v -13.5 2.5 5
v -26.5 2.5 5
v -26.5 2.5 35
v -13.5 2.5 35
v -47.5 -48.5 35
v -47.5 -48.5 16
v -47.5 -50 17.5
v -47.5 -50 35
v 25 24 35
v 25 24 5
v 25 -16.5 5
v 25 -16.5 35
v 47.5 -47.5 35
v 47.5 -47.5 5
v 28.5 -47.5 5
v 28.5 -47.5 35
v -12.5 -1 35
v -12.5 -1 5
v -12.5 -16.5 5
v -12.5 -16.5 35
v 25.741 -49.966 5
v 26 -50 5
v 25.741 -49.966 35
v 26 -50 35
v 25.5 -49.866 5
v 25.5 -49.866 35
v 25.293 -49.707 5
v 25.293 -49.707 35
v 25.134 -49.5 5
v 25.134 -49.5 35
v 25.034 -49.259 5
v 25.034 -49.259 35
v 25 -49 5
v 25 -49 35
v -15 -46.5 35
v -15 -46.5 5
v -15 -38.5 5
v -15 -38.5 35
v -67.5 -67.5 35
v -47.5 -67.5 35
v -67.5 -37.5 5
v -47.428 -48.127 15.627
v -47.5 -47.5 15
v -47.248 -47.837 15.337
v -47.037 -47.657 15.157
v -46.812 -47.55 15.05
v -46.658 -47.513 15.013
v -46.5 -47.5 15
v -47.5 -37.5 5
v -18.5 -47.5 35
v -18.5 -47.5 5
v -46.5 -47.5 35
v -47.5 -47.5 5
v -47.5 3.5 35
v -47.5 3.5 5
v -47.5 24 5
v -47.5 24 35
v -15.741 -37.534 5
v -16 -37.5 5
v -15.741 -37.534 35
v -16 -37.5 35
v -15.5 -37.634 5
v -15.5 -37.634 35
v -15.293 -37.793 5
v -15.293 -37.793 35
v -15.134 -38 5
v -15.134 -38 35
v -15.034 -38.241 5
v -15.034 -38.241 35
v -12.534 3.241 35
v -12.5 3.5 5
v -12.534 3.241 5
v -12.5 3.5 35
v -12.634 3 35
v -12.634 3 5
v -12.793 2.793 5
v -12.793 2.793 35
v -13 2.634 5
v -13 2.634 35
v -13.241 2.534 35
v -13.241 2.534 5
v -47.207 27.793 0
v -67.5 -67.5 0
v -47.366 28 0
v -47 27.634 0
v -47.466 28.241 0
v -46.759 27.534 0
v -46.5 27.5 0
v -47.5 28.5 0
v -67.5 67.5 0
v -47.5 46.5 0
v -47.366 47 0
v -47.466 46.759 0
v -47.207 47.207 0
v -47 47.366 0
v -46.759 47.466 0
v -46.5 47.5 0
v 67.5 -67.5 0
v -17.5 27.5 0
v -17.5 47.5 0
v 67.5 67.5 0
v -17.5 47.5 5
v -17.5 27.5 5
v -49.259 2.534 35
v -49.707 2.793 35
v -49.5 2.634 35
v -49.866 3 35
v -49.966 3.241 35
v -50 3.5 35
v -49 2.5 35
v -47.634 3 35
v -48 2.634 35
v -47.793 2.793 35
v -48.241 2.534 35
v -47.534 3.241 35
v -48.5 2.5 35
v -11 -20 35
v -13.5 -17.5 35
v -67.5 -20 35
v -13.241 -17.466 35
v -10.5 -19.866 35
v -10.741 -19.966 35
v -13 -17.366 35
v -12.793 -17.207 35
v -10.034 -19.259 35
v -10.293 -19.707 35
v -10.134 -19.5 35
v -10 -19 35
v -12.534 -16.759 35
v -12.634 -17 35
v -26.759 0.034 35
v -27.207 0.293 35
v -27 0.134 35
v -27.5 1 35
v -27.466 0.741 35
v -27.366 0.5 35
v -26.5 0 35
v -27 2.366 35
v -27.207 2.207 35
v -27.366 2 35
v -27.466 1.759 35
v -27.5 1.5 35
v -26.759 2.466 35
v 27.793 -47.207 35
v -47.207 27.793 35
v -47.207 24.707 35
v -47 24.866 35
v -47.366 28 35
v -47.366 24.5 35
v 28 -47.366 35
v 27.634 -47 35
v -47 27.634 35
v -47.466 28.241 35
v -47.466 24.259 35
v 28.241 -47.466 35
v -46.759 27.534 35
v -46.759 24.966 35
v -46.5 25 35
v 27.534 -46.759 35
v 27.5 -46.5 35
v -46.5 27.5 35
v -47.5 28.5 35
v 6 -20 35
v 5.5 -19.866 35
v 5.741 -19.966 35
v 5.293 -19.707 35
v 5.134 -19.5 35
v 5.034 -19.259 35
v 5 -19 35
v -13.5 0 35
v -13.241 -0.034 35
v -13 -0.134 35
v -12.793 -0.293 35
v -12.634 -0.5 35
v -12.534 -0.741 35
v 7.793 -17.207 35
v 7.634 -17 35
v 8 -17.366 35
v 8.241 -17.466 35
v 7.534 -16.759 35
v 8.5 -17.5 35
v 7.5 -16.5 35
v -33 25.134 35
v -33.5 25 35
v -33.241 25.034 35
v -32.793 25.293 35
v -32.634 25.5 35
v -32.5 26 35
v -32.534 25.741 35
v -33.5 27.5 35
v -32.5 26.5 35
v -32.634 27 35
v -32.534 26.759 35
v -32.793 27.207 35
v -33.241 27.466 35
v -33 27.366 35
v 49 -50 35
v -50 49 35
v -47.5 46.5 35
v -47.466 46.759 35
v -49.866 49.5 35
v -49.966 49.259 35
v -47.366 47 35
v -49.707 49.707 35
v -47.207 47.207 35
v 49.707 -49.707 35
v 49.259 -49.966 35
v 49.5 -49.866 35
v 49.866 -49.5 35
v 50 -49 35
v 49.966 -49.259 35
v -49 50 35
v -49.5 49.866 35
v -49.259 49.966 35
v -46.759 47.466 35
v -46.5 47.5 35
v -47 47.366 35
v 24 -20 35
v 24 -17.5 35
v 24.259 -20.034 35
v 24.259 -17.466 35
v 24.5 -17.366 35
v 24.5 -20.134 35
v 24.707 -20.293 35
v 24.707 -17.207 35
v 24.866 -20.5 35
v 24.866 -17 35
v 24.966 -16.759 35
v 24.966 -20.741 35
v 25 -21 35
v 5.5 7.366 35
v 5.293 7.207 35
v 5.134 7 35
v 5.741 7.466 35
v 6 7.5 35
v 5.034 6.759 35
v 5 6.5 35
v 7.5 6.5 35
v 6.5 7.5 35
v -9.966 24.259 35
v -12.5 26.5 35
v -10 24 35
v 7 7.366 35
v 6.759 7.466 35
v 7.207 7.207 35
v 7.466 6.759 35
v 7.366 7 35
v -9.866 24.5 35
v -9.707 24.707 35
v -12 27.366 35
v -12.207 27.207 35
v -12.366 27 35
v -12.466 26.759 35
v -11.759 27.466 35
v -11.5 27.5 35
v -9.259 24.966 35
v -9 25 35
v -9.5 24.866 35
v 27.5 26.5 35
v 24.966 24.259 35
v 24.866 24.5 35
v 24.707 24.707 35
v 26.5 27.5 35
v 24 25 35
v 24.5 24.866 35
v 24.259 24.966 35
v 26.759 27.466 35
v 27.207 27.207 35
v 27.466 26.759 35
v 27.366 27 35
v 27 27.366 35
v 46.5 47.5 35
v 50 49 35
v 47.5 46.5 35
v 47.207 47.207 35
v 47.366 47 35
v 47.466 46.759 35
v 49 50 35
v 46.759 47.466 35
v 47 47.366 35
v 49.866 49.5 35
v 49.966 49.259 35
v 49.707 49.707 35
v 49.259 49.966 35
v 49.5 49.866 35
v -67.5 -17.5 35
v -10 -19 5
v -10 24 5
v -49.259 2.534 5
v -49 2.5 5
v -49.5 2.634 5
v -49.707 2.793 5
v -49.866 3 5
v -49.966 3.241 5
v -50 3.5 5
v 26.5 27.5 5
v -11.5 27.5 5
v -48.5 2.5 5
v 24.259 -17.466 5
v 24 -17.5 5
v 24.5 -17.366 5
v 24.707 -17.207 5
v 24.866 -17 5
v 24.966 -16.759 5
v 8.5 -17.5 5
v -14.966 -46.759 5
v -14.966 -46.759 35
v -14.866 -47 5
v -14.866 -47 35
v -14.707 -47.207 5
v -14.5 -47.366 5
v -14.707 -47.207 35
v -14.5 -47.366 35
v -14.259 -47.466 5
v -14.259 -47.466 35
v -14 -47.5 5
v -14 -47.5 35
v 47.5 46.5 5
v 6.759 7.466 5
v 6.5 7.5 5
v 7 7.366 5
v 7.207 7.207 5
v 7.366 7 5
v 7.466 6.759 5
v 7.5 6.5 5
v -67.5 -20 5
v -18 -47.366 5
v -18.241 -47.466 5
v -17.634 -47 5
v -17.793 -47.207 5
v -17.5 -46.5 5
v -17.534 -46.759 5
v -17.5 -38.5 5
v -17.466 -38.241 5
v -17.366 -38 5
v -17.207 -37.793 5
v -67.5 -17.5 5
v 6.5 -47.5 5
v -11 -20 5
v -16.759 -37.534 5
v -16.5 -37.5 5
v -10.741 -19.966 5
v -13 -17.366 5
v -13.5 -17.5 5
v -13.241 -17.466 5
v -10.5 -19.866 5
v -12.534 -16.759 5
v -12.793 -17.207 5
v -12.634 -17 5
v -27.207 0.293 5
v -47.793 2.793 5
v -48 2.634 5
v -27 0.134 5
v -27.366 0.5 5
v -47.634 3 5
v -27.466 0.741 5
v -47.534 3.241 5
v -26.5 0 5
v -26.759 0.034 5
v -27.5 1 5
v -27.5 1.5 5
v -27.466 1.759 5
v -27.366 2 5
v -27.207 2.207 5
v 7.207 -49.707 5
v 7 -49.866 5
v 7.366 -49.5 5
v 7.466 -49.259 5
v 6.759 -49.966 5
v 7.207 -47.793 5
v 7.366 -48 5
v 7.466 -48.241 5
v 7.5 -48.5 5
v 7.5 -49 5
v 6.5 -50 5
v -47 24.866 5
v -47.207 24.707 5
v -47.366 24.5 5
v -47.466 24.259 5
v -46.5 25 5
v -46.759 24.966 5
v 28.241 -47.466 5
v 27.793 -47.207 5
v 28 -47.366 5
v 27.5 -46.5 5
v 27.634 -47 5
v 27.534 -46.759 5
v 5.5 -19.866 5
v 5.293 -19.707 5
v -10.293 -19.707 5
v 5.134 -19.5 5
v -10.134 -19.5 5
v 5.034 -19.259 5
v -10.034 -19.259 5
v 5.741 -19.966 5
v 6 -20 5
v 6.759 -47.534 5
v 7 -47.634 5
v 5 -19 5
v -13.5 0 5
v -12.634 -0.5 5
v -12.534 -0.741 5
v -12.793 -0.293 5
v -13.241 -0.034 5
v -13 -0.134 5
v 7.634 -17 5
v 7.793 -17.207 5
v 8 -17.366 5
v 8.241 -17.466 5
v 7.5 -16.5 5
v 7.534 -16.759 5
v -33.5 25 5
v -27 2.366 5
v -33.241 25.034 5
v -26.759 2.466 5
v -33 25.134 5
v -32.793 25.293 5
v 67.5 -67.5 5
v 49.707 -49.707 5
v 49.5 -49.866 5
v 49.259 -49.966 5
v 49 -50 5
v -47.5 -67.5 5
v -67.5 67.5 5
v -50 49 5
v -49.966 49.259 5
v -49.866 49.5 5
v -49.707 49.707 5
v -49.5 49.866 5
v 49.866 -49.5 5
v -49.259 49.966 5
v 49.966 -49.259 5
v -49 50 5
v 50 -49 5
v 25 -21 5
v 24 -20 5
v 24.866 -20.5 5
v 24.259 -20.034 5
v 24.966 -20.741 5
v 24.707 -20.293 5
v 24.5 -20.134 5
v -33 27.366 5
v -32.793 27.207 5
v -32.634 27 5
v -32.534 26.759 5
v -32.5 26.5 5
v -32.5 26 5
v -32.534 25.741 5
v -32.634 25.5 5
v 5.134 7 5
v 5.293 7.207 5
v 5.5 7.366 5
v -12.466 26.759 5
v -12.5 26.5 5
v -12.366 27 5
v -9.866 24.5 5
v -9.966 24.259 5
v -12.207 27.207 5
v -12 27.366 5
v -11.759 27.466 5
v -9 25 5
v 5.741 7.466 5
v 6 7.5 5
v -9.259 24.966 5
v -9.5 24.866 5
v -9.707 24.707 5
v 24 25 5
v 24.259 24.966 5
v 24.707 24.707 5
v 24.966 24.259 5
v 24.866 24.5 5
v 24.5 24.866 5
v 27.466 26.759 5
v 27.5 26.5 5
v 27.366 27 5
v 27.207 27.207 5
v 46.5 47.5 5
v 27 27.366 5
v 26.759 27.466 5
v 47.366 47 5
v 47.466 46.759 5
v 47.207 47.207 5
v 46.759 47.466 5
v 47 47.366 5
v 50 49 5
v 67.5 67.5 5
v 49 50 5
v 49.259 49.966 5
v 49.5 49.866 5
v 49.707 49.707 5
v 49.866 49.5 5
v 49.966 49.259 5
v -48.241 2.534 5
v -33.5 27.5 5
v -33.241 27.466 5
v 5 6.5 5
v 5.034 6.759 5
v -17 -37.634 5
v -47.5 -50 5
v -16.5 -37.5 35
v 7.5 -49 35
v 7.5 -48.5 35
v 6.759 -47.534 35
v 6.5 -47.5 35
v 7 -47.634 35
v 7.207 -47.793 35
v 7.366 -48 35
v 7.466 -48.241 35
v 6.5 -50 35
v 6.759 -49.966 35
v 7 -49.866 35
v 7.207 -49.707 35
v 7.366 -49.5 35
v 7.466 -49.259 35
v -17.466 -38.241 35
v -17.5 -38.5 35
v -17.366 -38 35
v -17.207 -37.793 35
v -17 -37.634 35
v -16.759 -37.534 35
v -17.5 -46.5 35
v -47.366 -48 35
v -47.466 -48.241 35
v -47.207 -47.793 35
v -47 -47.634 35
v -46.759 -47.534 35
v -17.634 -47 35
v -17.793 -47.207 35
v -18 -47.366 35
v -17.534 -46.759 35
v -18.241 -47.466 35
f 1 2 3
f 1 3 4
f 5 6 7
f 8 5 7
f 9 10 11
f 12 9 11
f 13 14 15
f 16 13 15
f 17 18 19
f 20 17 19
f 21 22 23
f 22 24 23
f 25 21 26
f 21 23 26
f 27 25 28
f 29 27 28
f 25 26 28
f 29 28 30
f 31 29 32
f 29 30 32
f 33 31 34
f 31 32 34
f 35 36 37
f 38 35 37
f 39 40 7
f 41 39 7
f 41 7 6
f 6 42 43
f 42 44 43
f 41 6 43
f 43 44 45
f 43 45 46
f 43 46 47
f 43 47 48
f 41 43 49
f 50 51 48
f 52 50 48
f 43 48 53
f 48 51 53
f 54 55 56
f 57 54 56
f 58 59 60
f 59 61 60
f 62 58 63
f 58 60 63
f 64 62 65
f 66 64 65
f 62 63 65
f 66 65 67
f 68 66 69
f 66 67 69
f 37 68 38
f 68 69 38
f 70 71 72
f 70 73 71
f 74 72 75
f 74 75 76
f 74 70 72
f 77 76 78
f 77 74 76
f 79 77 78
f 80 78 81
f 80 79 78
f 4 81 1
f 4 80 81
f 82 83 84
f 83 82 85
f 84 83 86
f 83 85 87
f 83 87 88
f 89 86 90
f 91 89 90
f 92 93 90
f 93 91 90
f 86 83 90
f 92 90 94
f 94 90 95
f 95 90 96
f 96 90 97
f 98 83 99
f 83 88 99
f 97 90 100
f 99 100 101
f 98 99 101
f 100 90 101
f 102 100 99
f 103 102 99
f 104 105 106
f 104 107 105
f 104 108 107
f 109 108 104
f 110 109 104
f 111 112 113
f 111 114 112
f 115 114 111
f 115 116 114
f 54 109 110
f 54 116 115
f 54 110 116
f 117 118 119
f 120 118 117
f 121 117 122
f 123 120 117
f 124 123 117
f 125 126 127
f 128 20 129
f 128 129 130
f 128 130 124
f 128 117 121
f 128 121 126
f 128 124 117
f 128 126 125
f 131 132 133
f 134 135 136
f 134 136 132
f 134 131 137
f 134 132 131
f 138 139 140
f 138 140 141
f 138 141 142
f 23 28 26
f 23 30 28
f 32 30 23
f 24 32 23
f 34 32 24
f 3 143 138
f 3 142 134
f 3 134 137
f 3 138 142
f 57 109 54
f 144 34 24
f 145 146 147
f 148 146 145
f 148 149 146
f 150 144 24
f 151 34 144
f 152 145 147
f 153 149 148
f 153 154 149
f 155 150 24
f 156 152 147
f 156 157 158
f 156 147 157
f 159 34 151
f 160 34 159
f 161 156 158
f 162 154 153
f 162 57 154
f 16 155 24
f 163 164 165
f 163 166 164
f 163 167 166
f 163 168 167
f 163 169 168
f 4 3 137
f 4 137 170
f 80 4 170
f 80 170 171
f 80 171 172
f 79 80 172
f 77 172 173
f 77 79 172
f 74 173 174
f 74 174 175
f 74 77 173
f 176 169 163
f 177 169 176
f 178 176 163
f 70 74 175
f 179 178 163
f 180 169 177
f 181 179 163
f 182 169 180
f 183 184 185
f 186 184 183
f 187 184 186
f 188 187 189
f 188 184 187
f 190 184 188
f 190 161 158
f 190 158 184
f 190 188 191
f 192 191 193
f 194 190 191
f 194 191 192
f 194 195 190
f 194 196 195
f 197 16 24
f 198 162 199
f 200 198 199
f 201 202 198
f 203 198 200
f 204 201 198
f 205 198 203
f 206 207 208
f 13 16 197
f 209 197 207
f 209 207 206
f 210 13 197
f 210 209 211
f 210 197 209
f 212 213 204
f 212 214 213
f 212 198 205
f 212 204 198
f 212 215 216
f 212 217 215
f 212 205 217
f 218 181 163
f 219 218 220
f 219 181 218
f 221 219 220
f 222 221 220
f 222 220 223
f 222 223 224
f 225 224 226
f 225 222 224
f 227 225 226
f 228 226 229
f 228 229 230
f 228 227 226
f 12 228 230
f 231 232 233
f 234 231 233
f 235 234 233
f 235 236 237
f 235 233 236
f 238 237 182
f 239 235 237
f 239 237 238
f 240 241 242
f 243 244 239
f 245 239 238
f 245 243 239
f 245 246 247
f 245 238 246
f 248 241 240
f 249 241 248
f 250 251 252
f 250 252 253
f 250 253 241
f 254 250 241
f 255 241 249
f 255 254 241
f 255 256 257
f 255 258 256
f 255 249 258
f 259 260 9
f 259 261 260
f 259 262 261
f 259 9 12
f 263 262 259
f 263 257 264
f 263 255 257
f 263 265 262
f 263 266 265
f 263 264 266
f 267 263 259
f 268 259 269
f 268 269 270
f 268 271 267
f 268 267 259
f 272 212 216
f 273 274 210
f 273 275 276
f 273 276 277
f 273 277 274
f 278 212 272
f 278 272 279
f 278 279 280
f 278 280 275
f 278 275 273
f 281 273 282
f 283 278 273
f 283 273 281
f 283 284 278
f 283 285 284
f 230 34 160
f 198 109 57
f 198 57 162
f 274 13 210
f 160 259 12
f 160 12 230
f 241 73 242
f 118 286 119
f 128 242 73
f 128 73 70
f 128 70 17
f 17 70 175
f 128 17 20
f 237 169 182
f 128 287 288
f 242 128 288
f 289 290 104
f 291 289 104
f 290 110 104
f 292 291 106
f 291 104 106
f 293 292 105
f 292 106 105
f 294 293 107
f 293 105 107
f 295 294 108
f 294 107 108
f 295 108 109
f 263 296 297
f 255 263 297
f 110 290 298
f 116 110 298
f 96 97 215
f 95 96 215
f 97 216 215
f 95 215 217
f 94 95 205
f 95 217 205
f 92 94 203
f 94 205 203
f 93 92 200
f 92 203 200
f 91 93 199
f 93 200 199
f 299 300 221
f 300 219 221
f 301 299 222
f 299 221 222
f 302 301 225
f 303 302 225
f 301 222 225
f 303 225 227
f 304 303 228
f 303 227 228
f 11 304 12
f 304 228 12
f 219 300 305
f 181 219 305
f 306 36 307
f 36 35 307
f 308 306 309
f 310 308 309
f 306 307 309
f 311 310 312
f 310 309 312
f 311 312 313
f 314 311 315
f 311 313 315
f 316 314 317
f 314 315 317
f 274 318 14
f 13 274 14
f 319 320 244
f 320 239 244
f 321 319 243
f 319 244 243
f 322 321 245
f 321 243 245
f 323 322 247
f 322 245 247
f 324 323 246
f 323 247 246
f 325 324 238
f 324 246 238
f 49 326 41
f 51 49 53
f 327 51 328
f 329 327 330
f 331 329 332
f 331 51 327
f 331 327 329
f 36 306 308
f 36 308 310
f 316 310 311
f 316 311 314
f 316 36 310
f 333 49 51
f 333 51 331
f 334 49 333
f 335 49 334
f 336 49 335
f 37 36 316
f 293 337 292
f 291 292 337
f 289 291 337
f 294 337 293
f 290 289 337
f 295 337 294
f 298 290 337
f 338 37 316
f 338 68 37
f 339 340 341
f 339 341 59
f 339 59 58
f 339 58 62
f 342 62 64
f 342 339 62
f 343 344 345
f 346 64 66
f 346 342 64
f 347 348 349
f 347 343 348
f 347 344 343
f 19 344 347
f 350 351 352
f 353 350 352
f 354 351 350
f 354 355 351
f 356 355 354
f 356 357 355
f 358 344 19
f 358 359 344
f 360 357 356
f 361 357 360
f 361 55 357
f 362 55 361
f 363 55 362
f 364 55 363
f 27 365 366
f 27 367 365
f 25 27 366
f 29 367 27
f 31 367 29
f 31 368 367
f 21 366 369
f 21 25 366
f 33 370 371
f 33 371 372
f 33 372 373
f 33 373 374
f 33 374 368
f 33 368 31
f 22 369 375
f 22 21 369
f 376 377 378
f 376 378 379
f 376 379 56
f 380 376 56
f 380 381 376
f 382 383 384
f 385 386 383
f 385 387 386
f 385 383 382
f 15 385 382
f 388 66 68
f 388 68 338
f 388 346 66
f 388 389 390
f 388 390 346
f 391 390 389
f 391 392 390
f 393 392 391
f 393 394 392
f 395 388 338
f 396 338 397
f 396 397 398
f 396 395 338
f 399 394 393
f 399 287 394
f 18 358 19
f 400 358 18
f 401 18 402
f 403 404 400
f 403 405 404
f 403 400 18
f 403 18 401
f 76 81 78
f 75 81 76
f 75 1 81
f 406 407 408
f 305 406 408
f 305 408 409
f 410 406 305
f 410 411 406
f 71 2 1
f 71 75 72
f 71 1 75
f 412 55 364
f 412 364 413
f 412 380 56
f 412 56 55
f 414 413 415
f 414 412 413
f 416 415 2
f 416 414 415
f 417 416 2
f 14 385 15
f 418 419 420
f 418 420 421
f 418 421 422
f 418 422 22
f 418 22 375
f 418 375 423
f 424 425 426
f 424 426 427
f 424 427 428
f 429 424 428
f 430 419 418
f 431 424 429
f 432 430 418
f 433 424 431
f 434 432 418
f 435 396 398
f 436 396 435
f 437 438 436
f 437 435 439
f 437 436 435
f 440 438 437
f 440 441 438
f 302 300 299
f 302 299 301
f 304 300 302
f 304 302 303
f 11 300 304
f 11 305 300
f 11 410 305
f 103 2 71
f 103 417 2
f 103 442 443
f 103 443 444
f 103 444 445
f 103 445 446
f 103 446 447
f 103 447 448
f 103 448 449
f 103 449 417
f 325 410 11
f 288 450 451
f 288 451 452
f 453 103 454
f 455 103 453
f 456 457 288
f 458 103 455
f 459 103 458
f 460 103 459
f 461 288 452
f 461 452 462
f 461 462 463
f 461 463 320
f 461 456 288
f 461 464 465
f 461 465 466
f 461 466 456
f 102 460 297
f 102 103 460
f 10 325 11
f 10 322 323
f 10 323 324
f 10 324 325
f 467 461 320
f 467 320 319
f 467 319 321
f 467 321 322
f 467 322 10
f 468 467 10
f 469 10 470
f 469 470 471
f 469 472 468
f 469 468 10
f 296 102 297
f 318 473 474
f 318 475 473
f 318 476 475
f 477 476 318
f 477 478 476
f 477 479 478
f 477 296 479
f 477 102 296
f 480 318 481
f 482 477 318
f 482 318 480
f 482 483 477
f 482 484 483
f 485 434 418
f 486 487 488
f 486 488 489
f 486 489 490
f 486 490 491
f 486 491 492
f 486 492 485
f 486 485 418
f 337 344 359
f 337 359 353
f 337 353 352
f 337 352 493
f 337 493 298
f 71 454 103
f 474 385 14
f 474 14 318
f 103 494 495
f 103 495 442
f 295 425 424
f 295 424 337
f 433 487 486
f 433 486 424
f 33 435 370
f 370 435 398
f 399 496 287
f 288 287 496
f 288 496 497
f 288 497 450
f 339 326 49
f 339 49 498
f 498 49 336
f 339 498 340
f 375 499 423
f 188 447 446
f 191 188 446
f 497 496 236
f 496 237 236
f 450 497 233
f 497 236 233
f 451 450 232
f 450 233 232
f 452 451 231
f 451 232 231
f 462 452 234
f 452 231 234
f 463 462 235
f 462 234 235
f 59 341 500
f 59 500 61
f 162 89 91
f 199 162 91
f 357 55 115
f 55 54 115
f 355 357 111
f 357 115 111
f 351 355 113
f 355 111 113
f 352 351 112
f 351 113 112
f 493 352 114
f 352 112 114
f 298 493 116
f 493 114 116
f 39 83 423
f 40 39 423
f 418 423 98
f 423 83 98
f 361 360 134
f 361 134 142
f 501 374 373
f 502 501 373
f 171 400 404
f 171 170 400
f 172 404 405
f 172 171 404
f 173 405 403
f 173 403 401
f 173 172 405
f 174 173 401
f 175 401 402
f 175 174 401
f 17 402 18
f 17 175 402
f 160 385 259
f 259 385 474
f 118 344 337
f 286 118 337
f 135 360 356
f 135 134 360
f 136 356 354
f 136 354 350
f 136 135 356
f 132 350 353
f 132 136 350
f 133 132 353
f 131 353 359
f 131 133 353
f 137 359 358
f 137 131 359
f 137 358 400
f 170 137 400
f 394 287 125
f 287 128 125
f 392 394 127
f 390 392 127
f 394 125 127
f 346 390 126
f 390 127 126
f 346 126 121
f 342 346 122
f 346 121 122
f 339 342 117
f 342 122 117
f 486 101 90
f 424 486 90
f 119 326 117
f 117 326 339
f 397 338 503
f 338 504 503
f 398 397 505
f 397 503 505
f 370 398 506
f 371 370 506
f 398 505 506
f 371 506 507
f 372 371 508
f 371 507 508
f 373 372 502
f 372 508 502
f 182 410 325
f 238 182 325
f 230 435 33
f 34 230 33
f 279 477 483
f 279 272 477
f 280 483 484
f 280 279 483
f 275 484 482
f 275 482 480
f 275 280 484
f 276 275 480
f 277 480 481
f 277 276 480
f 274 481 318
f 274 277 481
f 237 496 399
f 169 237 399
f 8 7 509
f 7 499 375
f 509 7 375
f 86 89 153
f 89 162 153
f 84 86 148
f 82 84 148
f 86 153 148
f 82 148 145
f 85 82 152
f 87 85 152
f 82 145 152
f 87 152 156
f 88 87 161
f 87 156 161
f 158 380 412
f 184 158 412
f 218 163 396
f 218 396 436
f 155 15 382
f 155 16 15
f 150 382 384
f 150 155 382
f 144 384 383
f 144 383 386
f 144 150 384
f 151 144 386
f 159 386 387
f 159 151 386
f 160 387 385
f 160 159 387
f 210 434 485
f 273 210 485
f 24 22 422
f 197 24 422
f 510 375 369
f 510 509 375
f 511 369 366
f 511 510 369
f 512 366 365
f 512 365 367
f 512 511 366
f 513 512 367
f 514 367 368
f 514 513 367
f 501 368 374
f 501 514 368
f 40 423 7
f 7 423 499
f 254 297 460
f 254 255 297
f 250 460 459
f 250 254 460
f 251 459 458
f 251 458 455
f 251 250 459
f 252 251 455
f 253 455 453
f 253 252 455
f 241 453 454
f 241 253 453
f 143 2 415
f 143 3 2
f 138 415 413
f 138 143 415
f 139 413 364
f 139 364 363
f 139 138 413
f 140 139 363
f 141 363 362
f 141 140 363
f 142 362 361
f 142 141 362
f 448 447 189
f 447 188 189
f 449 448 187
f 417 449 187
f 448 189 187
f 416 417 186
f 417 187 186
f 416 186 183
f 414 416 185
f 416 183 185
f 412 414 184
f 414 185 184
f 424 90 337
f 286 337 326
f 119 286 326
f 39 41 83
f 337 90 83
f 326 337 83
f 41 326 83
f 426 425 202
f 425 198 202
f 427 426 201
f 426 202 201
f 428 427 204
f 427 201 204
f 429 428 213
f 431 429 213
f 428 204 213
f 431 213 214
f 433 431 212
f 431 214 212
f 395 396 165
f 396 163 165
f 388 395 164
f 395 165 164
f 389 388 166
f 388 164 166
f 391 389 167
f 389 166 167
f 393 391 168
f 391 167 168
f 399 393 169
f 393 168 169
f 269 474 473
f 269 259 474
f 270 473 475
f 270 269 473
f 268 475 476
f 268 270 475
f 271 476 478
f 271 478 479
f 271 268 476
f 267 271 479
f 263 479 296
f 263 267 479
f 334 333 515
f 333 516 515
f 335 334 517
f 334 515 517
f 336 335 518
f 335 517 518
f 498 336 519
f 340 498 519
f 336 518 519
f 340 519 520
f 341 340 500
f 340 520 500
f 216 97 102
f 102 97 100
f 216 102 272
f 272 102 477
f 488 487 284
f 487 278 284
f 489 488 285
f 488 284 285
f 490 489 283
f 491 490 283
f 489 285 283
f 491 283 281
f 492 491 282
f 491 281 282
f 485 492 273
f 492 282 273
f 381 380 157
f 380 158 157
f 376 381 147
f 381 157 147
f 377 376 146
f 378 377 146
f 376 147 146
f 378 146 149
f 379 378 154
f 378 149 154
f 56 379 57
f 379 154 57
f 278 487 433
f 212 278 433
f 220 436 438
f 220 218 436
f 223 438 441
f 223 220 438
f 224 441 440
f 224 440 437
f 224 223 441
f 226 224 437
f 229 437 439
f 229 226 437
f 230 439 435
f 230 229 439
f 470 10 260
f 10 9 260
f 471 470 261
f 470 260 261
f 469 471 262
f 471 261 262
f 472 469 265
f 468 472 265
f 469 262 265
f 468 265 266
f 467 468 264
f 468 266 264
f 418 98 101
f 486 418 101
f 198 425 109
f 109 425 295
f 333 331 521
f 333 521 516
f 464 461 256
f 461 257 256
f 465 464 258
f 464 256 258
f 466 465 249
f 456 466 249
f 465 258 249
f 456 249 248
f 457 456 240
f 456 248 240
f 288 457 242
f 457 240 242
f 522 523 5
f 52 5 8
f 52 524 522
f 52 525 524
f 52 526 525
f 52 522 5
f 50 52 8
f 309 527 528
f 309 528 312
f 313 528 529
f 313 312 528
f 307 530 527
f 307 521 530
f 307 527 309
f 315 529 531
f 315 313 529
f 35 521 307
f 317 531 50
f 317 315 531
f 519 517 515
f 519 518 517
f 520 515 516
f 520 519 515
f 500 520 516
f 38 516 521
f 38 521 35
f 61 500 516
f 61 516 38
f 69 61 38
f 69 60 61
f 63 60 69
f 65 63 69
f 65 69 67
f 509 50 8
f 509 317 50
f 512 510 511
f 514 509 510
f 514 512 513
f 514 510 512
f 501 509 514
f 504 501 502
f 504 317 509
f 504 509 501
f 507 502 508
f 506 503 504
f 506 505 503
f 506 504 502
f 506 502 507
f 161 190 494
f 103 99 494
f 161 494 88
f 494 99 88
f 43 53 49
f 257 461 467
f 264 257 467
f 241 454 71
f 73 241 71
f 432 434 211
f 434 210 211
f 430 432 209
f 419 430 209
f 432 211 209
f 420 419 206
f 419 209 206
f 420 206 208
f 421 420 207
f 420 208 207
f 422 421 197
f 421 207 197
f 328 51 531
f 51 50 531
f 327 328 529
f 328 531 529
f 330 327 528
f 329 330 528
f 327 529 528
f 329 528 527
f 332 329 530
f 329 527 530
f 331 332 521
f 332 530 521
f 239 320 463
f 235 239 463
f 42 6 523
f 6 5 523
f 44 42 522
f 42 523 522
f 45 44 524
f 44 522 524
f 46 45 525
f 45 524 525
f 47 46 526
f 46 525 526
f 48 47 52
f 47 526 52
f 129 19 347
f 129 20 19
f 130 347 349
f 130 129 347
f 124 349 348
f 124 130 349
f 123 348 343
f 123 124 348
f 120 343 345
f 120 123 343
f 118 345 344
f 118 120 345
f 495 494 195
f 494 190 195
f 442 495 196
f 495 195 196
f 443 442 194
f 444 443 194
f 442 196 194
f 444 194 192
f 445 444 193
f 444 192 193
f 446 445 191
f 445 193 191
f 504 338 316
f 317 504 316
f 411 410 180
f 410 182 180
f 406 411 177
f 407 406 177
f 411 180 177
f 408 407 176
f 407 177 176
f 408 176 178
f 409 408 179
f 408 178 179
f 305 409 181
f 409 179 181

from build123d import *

# Parameters (mm, degrees)
F1_DEPTH = 5
F2_DEPTH = 35
F4_DEPTH = 25
F0_W     = 15
F0_H     = 2.5
F0_W_2   = 2.5
F0_H_2   = 10
F5_DEPTH = 35
F6_R     = 1


# Not quite as in the source:
# - two fillets or chamfers of one size are made in one step


with BuildPart() as f1:
    # F0 (on Top) → F1 (new body)
    with BuildSketch(Plane.XY):
        Polygon((67.5, 67.5), (-67.5, 67.5), (-67.5, -17.5), (-12.5, -17.5), (-12.5, 0), (-27.5, 0), (-27.5, 2.5), (-12.5, 2.5), (-12.5, 25), (-12.5, 27.5), (-10, 27.5), (27.5, 27.5), (27.5, -17.5), (27.5, -20), (27.5, -47.5), (47.5, -47.5), (47.5, 47.5), (-17.5, 47.5), (-17.5, 27.5), (-32.5, 27.5), (-32.5, 25), (-47.5, 25), (-47.5, 2.5), (-50, 2.5), (-50, 50), (50, 50), (50, -50), (25, -50), (25, -20), (5, -20), (5, 7.5), (7.5, 7.5), (7.5, -17.5), (25, -17.5), (25, 25), (-10, 25), (-10, -20), (-67.5, -20), (-67.5, -37.5), (-47.5, -37.5), (-47.5, -47.5), (-17.5, -47.5), (-17.5, -37.5), (-15, -37.5), (-15, -47.5), (7.5, -47.5), (7.5, -50), (-47.5, -50), (-47.5, -67.5), (67.5, -67.5), align=None)
    extrude(amount=F1_DEPTH)

    # F0 (on Top) → F2 (join)
    with BuildSketch(Plane.XY):
        Polygon((-67.5, -67.5), (-47.5, -67.5), (-47.5, -50), (-47.5, -47.5), (-47.5, -37.5), (-67.5, -37.5), align=None)
    extrude(amount=F2_DEPTH)

    # F3 (on face) → F4 (cut)
    with BuildSketch(Plane.YZ.offset(-47.5)):
        Polygon((-37.5, 35), (-67.5, 35), (-37.5, 5), align=None)
    extrude(amount=-F4_DEPTH, mode=Mode.SUBTRACT)

    # F0 (on Top) → F5 (join)
    with BuildSketch(Plane.XY):
        Polygon((27.5, -20), (25, -20), (25, -50), (50, -50), (50, 50), (-50, 50), (-50, 2.5), (-47.5, 2.5), (-47.5, 25), (-47.5, 27.5), (-47.5, 47.5), (-17.5, 47.5), (47.5, 47.5), (47.5, -47.5), (27.5, -47.5), align=None)
        Polygon((-47.5, -47.5), (-47.5, -50), (7.5, -50), (7.5, -47.5), (-15, -47.5), (-17.5, -47.5), align=None)
        Polygon((-12.5, -17.5), (-67.5, -17.5), (-67.5, -20), (-10, -20), (-10, 25), (-12.5, 25), (-12.5, 2.5), (-12.5, 0), align=None)
        with Locations((-20, 1.25)):
            Rectangle(F0_W, F0_H)
        with Locations((-40, 26.25)):
            Rectangle(F0_W, F0_H)
        Polygon((-10, 27.5), (-10, 25), (25, 25), (25, -17.5), (27.5, -17.5), (27.5, 27.5), align=None)
        with Locations((-11.25, 26.25)):
            Rectangle(F0_W_2, F0_H)
        Polygon((25, -20), (25, -17.5), (7.5, -17.5), (7.5, 7.5), (5, 7.5), (5, -20), align=None)
        with Locations((26.25, -18.75)):
            Rectangle(F0_W_2, F0_H)
        with Locations((-16.25, -42.5)):
            Rectangle(F0_W_2, F0_H_2)
    extrude(amount=F5_DEPTH)

    # F6
    f6_edges = [f1.edges().sort_by_distance(p)[0] for p in [
        (7.5, -50, 20),
        (7.5, -47.5, 20),
        (-10, -20, 20),
        (-15, -37.5, 20),
        (5, -20, 20),
        (25, -50, 20),
        (50, -50, 20),
        (27.5, 27.5, 20),
        (50, 50, 20),
        (-47.5, 47.5, 17.5),
        (-27.5, 0, 20),
        (-47.5, 25, 20),
        (-32.5, 25, 20),
        (-32.5, 27.5, 20),
        (-10, 25, 20),
        (7.5, 7.5, 20),
        (-47.5, 2.5, 20),
        (-50, 2.5, 20),
        (-47.5, -47.5, 25),
        (-50, 50, 20),
        (25, -20, 20),
        (-12.5, 2.5, 20),
        (25, -17.5, 20),
        (-12.5, -17.5, 20),
        (27.5, -47.5, 20),
        (-12.5, 27.5, 20),
        (-47.5, 27.5, 17.5),
        (7.5, -17.5, 20),
        (-17.5, -37.5, 20),
        (25, 25, 20),
        (-15, -47.5, 20),
        (-17.5, -47.5, 20),
        (5, 7.5, 20),
        (47.5, 47.5, 20),
        (-27.5, 2.5, 20),
        (-12.5, 0, 20),
    ]]
    fillet(f6_edges, radius=F6_R)


solid = f1.part
